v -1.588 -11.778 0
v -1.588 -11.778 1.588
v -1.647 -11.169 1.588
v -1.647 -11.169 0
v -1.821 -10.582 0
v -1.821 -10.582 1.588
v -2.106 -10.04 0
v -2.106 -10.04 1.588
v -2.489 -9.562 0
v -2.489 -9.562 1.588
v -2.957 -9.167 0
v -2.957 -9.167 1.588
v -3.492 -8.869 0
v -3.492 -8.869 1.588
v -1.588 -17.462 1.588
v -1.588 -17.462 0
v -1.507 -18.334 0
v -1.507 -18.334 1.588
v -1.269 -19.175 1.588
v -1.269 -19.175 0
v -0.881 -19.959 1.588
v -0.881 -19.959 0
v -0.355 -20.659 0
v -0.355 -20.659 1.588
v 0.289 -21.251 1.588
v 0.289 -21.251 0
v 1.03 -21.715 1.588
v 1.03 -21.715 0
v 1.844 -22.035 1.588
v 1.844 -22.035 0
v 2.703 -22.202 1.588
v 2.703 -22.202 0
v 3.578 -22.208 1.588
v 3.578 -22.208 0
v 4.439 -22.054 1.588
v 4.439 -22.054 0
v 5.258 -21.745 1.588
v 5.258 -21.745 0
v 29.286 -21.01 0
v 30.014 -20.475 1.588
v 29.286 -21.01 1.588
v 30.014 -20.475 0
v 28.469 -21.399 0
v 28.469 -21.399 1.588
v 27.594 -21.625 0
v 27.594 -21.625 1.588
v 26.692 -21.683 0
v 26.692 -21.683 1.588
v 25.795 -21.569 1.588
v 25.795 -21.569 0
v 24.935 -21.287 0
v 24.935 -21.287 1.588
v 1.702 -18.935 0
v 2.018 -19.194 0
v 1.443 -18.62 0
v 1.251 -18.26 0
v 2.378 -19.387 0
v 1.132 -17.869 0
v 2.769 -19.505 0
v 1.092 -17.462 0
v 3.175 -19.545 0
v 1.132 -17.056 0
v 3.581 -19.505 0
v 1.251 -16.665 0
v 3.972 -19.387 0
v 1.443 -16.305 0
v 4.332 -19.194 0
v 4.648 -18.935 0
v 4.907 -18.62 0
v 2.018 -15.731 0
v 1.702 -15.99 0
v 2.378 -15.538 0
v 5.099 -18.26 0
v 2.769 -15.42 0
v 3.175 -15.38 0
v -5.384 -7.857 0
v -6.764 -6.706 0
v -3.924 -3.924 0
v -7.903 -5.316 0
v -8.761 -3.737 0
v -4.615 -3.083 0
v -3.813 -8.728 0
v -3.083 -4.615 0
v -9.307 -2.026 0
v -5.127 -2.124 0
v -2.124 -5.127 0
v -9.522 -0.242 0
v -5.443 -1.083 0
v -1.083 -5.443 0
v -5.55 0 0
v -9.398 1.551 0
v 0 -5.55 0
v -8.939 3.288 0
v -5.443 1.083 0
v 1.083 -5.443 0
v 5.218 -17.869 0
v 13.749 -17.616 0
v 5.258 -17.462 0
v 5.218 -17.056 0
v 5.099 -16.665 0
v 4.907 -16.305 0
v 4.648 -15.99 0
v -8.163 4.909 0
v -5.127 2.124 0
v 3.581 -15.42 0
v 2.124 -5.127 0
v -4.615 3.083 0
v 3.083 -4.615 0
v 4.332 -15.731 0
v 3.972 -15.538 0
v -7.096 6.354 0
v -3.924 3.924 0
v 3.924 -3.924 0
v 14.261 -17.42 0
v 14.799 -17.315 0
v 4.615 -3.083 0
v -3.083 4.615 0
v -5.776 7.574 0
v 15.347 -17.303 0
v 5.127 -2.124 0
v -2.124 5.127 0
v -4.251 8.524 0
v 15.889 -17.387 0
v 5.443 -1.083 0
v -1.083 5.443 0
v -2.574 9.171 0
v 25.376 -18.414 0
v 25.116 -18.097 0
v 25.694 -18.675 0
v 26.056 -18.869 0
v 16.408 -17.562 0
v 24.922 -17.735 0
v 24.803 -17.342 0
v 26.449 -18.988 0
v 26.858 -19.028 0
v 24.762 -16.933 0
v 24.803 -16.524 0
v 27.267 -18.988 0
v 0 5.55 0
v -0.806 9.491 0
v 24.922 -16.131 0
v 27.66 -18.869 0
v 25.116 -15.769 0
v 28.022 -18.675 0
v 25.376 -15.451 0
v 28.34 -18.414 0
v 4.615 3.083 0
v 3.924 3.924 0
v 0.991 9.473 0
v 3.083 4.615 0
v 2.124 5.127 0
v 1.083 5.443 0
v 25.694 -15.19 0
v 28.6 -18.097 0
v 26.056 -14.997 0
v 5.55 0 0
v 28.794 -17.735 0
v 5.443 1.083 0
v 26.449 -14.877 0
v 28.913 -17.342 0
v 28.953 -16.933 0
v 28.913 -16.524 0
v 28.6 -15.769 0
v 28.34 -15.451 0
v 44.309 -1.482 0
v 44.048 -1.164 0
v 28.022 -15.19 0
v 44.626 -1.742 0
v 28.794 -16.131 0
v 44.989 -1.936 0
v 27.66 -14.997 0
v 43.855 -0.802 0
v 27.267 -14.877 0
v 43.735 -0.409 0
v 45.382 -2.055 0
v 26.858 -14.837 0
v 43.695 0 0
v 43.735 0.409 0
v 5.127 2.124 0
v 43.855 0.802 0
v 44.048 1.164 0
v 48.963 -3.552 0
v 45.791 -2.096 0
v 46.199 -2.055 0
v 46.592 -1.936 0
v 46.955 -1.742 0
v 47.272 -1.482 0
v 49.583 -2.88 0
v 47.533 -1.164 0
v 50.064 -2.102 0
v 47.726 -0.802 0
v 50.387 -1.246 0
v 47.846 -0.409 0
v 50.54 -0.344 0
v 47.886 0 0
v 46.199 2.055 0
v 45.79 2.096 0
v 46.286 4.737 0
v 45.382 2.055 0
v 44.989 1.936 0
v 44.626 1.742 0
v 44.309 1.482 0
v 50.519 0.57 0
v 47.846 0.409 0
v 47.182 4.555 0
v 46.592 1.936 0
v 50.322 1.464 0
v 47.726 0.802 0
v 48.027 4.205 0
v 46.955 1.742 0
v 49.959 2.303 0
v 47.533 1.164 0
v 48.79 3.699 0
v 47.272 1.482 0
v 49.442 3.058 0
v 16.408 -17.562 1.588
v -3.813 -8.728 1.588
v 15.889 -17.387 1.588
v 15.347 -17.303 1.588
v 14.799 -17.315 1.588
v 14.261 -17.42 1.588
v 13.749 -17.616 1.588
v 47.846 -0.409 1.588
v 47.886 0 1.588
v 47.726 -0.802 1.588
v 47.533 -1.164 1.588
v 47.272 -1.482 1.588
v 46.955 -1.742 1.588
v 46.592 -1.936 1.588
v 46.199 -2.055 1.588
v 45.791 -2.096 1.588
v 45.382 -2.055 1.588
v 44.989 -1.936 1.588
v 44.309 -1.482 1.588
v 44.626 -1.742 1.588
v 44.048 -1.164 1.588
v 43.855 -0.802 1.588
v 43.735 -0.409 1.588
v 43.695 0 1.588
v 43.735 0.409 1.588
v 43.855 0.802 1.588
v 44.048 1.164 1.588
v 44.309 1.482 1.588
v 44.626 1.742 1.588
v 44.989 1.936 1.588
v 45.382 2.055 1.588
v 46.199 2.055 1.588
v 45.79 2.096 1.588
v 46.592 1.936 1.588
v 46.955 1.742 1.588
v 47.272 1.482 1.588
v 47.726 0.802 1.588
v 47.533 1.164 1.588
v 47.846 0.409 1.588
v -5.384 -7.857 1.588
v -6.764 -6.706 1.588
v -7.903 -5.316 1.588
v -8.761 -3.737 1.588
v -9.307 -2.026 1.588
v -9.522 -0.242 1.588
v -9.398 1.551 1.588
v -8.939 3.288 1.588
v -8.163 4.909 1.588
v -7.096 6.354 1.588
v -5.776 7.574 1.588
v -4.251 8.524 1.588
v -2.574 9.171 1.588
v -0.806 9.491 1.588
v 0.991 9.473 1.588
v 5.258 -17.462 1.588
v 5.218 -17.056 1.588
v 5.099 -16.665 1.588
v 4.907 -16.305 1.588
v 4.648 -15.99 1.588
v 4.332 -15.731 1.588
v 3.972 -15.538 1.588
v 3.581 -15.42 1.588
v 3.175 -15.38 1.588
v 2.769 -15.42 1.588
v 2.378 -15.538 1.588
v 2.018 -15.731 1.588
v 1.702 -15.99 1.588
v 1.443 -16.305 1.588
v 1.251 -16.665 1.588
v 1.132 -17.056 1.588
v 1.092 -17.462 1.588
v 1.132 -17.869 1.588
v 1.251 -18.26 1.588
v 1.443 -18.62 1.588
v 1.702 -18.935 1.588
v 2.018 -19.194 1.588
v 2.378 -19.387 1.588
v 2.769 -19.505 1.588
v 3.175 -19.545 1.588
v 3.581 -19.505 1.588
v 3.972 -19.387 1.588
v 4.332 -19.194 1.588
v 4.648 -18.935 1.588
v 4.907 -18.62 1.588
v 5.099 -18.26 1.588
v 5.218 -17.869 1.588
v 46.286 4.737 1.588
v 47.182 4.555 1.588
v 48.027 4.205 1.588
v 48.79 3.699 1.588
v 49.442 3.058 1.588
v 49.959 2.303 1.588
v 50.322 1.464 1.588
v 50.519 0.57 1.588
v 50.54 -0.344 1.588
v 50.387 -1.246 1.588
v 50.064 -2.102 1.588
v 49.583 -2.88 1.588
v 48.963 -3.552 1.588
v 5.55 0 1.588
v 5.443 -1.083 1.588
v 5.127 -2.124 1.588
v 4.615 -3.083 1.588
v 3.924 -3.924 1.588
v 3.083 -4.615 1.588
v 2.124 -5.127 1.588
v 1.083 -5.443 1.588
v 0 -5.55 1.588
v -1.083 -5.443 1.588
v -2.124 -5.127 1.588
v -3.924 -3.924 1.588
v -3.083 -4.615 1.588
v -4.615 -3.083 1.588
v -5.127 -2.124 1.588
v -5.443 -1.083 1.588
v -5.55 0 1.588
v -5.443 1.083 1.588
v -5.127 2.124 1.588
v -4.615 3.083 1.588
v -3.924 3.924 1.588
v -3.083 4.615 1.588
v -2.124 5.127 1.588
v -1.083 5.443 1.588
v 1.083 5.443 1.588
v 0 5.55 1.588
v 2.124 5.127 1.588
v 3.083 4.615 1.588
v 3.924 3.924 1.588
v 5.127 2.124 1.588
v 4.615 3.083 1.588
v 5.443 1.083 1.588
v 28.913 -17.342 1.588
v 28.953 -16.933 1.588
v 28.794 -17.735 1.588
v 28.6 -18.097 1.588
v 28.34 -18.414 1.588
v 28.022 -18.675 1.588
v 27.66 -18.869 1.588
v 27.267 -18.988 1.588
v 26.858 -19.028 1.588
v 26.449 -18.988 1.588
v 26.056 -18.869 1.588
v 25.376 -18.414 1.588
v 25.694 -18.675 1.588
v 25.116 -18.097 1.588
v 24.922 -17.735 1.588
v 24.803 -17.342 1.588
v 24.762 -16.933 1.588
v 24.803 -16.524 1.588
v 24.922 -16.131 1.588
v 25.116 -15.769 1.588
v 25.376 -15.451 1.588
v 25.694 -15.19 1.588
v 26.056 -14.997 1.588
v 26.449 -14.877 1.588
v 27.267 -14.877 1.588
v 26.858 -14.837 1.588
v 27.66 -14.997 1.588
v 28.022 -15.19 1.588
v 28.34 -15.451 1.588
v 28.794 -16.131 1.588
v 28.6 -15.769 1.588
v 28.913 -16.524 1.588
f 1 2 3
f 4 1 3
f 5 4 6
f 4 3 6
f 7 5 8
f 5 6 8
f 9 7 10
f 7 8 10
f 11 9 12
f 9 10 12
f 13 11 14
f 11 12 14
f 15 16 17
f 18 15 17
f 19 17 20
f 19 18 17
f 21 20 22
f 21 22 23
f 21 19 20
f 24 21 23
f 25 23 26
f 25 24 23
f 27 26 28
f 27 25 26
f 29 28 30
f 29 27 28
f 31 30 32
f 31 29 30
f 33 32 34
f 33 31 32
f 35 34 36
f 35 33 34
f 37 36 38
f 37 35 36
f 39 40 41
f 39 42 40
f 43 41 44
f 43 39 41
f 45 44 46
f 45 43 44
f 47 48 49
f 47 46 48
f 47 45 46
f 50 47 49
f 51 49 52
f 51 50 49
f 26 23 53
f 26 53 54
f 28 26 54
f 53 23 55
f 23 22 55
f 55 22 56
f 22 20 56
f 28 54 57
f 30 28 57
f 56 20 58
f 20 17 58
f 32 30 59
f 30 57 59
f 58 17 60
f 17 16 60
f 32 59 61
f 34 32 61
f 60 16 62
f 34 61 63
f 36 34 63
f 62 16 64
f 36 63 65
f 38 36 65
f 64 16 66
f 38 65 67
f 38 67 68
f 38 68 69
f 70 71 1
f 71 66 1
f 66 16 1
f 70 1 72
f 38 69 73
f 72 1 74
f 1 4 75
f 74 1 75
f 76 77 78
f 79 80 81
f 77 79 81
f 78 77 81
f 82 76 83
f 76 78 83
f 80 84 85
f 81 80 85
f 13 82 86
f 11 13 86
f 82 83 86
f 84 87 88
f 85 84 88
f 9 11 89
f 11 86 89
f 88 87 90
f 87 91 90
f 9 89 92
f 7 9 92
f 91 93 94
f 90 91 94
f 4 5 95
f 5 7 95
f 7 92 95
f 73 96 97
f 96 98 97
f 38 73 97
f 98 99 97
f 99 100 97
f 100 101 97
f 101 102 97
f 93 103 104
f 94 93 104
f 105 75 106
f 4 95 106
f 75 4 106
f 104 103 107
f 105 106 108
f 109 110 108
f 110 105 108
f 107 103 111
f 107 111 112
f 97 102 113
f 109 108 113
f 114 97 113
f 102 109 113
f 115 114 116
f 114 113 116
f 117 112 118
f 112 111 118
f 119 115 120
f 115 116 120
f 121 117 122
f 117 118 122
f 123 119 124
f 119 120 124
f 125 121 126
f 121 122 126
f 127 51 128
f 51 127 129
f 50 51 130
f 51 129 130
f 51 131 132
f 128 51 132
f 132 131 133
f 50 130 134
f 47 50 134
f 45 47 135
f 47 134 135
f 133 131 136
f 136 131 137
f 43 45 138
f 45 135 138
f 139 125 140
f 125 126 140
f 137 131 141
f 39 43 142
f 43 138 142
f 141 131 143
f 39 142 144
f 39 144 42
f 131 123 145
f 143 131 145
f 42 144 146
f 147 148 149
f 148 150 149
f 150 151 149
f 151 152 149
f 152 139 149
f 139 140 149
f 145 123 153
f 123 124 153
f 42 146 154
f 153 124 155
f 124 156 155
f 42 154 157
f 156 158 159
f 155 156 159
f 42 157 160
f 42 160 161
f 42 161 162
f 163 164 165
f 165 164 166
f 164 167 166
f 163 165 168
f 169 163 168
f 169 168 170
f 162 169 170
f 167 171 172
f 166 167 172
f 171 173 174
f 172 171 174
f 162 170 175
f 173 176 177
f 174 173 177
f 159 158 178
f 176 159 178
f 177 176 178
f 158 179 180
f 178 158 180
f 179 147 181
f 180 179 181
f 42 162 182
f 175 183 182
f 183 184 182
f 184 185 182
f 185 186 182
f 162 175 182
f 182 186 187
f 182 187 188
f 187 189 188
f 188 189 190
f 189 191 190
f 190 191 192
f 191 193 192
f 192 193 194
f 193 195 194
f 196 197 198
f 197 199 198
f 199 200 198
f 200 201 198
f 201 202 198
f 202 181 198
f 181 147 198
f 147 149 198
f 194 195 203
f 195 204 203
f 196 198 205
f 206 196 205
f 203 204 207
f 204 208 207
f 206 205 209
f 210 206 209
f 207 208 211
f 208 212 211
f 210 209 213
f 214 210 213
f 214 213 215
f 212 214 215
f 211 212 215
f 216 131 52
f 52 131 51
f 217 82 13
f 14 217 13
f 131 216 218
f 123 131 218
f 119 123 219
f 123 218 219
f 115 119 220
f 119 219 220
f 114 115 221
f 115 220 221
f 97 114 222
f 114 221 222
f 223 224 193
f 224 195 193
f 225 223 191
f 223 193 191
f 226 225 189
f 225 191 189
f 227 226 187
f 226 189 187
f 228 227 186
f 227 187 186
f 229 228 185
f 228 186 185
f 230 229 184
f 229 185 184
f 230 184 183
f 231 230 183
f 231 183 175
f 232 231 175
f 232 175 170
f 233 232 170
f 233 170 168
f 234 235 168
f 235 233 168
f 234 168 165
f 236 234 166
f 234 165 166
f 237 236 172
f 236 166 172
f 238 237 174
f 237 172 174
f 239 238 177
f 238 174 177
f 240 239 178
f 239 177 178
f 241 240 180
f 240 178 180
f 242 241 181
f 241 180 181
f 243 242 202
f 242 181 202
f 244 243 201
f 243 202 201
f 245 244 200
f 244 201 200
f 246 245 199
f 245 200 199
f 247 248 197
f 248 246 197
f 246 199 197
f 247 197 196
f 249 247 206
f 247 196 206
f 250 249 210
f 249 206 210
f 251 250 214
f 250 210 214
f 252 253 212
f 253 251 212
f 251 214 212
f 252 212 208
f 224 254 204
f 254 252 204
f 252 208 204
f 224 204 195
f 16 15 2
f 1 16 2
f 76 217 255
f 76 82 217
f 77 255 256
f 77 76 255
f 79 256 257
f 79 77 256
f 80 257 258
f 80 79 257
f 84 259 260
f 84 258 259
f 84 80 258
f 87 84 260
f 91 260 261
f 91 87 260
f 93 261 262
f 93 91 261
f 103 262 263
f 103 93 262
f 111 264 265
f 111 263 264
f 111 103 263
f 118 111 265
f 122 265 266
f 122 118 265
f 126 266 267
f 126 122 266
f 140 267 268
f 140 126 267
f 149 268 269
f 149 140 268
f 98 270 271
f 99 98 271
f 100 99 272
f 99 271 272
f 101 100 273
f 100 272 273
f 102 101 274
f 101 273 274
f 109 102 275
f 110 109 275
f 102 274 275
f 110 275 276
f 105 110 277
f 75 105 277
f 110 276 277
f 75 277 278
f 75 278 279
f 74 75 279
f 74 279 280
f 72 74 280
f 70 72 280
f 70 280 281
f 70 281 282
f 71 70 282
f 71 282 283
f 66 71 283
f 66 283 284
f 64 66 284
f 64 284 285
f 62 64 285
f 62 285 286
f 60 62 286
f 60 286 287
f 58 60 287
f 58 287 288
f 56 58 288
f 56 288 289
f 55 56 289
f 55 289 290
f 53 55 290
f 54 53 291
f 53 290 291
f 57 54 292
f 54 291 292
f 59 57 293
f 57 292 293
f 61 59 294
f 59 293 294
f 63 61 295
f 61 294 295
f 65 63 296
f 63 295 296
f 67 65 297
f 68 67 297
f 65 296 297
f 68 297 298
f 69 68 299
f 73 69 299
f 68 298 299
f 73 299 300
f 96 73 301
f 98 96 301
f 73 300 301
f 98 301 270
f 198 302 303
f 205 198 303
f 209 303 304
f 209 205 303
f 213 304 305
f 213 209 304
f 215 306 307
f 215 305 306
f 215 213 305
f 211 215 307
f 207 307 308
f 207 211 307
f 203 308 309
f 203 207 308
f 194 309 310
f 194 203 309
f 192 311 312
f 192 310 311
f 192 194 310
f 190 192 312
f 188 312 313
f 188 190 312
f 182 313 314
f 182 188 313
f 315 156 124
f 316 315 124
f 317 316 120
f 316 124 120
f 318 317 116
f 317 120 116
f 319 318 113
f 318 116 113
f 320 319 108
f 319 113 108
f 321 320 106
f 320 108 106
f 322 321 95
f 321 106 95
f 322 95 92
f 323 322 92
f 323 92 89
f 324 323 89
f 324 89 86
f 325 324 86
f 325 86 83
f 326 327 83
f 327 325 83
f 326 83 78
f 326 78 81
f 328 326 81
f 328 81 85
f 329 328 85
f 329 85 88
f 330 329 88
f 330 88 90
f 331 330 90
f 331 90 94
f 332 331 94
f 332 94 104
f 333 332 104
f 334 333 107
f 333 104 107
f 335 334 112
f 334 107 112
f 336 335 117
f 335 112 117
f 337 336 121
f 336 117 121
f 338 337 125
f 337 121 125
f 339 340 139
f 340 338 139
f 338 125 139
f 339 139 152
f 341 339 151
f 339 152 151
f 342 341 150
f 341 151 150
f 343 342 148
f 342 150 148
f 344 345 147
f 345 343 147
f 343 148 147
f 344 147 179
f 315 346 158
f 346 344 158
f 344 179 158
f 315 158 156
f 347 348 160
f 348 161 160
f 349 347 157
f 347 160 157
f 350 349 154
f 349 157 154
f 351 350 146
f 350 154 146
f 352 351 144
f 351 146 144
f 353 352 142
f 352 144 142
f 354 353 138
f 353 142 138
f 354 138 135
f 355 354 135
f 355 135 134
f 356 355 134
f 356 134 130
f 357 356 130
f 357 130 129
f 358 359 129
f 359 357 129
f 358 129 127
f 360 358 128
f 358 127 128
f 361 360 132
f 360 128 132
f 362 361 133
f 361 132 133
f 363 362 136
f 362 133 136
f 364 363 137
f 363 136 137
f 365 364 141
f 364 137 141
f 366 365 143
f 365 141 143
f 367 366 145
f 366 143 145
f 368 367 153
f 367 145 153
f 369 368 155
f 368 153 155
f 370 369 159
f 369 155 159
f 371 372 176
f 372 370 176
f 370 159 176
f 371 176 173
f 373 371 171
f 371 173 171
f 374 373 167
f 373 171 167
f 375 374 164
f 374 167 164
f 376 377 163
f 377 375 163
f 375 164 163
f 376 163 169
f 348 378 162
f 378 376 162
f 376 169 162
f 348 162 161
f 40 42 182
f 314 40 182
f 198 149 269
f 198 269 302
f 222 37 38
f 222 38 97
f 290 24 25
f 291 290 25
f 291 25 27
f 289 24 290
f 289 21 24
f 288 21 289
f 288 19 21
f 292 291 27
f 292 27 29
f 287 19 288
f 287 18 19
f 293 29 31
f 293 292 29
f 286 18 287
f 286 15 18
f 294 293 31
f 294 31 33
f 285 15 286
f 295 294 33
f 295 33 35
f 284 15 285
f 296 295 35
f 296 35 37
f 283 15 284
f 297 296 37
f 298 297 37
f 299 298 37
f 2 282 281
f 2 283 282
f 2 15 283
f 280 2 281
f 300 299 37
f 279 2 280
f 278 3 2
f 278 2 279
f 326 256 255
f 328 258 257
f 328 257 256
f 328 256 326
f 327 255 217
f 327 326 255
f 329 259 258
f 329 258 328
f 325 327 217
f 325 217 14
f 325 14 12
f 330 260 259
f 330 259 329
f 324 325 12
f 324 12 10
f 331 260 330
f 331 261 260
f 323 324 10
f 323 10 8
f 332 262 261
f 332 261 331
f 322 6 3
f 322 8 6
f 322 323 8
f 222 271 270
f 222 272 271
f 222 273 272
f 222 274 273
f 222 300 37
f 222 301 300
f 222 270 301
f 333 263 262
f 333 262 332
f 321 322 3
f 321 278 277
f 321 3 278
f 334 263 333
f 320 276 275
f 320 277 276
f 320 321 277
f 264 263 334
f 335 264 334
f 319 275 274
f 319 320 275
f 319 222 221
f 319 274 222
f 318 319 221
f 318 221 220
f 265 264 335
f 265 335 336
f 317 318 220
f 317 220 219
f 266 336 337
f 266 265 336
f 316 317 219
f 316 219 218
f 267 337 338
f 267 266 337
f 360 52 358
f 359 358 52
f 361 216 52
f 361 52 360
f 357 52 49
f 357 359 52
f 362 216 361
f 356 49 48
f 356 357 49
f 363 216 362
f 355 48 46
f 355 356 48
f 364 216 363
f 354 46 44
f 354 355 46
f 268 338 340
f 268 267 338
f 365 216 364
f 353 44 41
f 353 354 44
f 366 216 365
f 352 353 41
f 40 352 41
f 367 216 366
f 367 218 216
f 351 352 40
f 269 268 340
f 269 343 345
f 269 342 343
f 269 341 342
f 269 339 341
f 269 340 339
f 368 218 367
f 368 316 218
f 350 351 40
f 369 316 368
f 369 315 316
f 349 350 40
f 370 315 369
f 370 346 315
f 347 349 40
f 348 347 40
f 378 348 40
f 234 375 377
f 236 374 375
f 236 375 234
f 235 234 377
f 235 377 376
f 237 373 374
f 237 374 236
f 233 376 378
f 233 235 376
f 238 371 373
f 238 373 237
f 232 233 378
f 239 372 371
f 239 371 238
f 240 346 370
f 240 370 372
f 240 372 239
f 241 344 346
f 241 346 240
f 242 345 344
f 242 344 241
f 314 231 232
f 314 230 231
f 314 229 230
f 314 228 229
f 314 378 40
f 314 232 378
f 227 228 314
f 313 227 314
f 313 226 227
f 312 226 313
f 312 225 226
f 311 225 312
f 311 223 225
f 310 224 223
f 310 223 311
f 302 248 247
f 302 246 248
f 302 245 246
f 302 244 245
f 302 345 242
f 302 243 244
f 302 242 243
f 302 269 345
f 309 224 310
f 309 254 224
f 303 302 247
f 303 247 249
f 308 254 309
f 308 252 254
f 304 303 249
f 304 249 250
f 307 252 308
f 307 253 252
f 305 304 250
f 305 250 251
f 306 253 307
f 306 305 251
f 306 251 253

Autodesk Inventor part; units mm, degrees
ref_plane "YZ Plane" through (0, 0, 0) normal (1, 0, 0) x (0, 1, 0)
ref_plane "XZ Plane" through (0, 0, 0) normal (0, 1, 0) x (-1, 0, 0)
ref_plane "XY Plane" through (0, 0, 0) normal (0, 0, 1) x (1, 0, 0)
sketch "Sketch1" plane through (0, 0, 0) normal (0, 0, 1) x (1, 0, 0)
  circle A0 centre (0, 0) radius 5.5499
  circle A1 centre (45.7905, 0) radius 2.0955
  circle A2 centre (26.8579, -16.9327) radius 2.0955
  arc A3 (0.9907, 9.4733) -> (-3.8129, -8.7285) centre (0, 0) ccw
  arc A4 (48.9628, -3.5521) -> (46.2858, 4.7367) centre (45.7905, 0) ccw
  arc A5 (24.9354, -21.2869) -> (30.0142, -20.4747) centre (26.8419, -16.9226) ccw
  line L0 (0.9907, 9.4733) -> (46.2858, 4.7367)
  line L1 (30.0142, -20.4747) -> (48.9628, -3.5521)
  line L2 (-3.8129, -8.7285) -> (24.9354, -21.2869)
  dimension "d0" = 11.0998
  dimension "d12" = 4.191
  dimension "d15" = 4.191
  dimension "d16" = 19.05
  dimension "d17" = 9.525
  dimension "d18" = 9.525
extrude "Extrusion1" add sketch "Sketch1" along normal blind 1.5875
sketch "Sketch2" plane through (0, 0, 1.5875) normal (0, 0, 1) x (1, 0, 0)
  circle A0 centre (3.175, -17.4625) radius 2.0828
  arc A1 (-1.5875, -17.4625) -> (5.2577, -21.7454) centre (3.175, -17.4625) ccw
  line L0 (-1.5875, -17.4625) -> (-1.5875, -11.7784)
  line L1 (-3.8129, -8.7285) -> (24.9354, -21.2869) projected
  arc A2 (-1.5875, -11.7784) -> (-3.4915, -8.8689) centre (-4.7625, -11.7784) ccw
  line L2 (5.2577, -21.7454) -> (13.7491, -17.6162)
  arc A3 (24.9354, -21.2869) -> (30.0142, -20.4747) centre (26.8419, -16.9226) ccw projected
  arc A4 (16.4085, -17.562) -> (13.7491, -17.6162) centre (15.1376, -20.4715) ccw
  point P0 (0, 0)
  point P1 (-1.5875, -9.7007)
  point P2 (15.0663, -16.9757)
  dimension "d19" = 4.1656
  dimension "d20" = 3.175
  dimension "d21" = 3.175
extrude "Extrusion2" add sketch "Sketch2" against normal blind 1.5875
properties part number "gear_gusset" material "Acetal Resin, White"
